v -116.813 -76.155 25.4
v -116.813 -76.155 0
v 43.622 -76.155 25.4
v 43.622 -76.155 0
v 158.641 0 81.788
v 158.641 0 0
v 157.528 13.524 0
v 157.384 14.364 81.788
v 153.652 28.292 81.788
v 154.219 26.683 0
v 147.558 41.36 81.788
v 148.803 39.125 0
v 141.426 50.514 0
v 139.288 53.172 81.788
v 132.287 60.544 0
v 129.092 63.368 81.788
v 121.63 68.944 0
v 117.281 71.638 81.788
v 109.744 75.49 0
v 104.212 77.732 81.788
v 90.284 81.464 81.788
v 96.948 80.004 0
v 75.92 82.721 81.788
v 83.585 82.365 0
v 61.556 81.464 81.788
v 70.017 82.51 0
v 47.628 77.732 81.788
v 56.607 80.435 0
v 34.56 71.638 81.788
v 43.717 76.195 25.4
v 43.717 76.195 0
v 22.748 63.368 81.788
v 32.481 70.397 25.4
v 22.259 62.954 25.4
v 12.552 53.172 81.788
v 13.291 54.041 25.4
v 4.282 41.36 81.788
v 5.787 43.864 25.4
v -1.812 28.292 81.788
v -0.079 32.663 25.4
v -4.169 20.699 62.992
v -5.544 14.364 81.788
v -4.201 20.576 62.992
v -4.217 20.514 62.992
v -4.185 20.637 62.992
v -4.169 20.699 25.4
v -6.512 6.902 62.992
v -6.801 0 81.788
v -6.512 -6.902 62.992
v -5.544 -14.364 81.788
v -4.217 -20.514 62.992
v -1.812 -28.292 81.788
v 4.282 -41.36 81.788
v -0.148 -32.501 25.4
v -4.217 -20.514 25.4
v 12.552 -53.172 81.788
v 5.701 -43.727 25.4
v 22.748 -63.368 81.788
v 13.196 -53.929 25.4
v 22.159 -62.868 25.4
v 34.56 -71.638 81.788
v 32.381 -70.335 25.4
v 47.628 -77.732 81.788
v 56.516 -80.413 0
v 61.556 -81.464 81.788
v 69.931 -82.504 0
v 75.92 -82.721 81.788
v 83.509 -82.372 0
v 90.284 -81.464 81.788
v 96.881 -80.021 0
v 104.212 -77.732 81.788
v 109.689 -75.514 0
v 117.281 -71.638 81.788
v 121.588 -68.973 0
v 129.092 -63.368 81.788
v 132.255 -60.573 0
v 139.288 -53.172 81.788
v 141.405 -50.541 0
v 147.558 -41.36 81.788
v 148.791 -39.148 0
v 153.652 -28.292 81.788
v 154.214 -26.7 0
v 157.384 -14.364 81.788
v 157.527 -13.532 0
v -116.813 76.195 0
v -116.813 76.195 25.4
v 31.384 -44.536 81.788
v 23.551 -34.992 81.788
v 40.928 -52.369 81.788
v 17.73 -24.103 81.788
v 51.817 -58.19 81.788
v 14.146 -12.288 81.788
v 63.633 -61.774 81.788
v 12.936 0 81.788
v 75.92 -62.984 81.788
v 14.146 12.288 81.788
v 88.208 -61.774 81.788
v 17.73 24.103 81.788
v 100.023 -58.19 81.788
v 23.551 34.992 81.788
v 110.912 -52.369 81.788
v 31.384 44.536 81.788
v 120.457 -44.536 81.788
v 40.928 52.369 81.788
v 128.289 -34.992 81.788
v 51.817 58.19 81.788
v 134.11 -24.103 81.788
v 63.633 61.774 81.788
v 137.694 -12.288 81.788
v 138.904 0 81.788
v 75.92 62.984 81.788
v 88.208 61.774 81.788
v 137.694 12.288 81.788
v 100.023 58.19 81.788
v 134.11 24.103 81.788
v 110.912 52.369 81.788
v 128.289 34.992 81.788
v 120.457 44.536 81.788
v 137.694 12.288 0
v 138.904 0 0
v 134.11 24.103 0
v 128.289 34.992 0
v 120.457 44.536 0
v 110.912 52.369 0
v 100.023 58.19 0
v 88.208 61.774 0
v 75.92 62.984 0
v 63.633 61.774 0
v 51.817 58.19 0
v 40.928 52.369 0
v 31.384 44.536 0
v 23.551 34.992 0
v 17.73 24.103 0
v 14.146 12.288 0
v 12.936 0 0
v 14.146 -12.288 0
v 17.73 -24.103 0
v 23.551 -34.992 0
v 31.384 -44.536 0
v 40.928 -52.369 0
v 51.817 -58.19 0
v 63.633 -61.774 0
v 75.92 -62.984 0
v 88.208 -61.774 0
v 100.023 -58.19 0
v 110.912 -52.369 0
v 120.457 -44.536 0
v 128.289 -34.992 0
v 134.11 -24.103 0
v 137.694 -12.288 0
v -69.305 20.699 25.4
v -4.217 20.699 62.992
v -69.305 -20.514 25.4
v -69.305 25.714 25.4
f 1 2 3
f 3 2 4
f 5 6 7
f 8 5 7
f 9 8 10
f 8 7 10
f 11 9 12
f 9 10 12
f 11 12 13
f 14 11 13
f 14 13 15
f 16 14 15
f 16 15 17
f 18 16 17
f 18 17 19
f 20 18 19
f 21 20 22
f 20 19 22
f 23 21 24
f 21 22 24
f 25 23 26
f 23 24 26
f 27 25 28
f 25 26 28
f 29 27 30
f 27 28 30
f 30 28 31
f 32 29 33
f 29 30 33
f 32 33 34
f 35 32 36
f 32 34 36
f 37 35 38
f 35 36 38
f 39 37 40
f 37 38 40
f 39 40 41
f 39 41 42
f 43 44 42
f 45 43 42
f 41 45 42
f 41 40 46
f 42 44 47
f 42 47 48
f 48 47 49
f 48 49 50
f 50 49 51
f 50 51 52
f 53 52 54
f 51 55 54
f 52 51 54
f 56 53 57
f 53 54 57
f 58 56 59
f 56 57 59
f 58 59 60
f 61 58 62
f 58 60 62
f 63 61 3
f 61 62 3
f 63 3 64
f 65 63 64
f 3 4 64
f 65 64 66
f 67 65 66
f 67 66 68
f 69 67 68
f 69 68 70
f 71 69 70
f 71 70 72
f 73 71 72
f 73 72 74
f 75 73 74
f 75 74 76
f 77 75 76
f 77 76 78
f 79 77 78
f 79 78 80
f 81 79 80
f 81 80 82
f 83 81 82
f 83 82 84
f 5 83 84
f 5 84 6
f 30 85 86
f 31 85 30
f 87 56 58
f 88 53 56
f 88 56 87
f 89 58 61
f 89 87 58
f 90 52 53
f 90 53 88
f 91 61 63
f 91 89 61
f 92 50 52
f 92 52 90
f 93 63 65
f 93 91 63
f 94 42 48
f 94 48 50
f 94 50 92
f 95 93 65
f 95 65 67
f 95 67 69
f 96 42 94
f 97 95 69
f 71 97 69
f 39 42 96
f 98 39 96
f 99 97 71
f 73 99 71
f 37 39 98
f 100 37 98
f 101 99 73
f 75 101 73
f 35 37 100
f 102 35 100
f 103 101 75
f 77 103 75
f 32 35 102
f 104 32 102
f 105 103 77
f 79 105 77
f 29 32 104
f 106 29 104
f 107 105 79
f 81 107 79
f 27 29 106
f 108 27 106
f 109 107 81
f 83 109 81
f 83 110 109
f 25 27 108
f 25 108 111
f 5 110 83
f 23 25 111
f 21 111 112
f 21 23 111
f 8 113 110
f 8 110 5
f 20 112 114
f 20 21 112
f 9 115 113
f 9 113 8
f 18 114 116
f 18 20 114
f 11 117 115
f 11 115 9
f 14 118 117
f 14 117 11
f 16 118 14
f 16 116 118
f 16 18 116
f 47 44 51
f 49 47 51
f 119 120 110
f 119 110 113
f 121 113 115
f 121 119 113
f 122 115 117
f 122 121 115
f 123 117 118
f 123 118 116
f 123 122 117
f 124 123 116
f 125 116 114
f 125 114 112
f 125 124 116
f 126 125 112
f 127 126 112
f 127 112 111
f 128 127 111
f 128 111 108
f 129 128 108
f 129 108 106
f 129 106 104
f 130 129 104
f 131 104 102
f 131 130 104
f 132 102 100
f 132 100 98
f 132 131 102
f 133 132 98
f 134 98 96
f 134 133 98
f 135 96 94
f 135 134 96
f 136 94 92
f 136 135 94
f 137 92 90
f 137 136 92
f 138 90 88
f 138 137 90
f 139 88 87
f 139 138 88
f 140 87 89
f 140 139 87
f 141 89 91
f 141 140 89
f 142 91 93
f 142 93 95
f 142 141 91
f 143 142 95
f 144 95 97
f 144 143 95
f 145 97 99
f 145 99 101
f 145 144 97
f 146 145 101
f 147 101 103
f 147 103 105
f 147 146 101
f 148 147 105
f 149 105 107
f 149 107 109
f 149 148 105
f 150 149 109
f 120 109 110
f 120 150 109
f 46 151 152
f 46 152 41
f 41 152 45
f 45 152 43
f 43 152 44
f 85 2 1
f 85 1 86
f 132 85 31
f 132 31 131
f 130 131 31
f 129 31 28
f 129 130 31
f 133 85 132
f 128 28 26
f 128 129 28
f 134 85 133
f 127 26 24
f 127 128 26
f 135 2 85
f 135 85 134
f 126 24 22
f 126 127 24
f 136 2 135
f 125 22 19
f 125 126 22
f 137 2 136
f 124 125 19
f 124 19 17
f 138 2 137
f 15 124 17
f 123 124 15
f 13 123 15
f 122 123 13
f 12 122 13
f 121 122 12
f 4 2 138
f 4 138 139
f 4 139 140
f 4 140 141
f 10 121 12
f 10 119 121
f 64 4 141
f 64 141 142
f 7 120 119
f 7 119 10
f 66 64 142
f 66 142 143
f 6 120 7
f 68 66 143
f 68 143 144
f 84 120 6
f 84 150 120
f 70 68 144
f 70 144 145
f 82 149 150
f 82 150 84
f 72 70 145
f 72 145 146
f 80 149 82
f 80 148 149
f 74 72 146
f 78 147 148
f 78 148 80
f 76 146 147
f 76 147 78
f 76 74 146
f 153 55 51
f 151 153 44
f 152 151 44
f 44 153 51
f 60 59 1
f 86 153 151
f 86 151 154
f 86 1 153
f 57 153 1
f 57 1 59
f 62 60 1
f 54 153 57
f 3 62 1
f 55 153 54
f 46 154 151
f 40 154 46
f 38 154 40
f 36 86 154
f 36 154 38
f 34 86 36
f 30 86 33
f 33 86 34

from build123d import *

# Parameters (mm, degrees)
F0_W     = 193.0230408907
F0_H     = 152.3501798511
F2_DEPTH = 25.4
F3_DEPTH = 82.042
F4_R     = 82.7208063485
F4_R_2   = 62.9840996432
F5_DEPTH = 81.788
F7_DEPTH = 62.992
F9_DEPTH = 46.228


with BuildPart() as f2:
    # F0 (on Top) → F2 (new body)
    with BuildSketch(Plane.XY):
        with Locations((-20.3011333942, 0.0200085342)):
            Rectangle(F0_W, F0_H)
    extrude(amount=F2_DEPTH)

    # F1 (on face) → F3 (cut)
    with BuildSketch(Plane.XY):
        with BuildLine():
            Line((76.2103870511, -63.3074275445), (76.2103870511, 63.3074275445))
            ThreePointArc((76.2103870511, 63.3074275445), (12.8221735358, 0), (76.2103870511, -63.3074275445))
        make_face()
    extrude(amount=F3_DEPTH, mode=Mode.SUBTRACT)

    # F4 (on Top) → F5 (join)
    with BuildSketch(Plane.XY):
        with Locations((75.9201049805, 0)):
            Circle(F4_R)
        with Locations((75.9201049805, 0)):
            Circle(F4_R_2, mode=Mode.SUBTRACT)
    extrude(amount=F5_DEPTH)

    # F6 (on face) → F7 (join)
    with BuildSketch(Plane(origin=(0, 0, 0), x_dir=(1, 0, 0), z_dir=(0, 0, -1))):
        Polygon((8.5411956534, -20.6989627331), (8.5411956534, 0), (8.5411956534, 20.5139704049), (-69.3054571748, 20.5139704049), (-69.3054571748, -20.6989627331), align=None)
    extrude(amount=-F7_DEPTH)

    # F8 (on face) → F9 (cut)
    with BuildSketch(Plane.XZ.offset(20.5139704049)):
        Polygon((-69.3054571748, 25.4), (-4.2167081654, 62.992), (-69.3054571748, 62.992), align=None)
    extrude(amount=-F9_DEPTH, mode=Mode.SUBTRACT)


solid = f2.part
